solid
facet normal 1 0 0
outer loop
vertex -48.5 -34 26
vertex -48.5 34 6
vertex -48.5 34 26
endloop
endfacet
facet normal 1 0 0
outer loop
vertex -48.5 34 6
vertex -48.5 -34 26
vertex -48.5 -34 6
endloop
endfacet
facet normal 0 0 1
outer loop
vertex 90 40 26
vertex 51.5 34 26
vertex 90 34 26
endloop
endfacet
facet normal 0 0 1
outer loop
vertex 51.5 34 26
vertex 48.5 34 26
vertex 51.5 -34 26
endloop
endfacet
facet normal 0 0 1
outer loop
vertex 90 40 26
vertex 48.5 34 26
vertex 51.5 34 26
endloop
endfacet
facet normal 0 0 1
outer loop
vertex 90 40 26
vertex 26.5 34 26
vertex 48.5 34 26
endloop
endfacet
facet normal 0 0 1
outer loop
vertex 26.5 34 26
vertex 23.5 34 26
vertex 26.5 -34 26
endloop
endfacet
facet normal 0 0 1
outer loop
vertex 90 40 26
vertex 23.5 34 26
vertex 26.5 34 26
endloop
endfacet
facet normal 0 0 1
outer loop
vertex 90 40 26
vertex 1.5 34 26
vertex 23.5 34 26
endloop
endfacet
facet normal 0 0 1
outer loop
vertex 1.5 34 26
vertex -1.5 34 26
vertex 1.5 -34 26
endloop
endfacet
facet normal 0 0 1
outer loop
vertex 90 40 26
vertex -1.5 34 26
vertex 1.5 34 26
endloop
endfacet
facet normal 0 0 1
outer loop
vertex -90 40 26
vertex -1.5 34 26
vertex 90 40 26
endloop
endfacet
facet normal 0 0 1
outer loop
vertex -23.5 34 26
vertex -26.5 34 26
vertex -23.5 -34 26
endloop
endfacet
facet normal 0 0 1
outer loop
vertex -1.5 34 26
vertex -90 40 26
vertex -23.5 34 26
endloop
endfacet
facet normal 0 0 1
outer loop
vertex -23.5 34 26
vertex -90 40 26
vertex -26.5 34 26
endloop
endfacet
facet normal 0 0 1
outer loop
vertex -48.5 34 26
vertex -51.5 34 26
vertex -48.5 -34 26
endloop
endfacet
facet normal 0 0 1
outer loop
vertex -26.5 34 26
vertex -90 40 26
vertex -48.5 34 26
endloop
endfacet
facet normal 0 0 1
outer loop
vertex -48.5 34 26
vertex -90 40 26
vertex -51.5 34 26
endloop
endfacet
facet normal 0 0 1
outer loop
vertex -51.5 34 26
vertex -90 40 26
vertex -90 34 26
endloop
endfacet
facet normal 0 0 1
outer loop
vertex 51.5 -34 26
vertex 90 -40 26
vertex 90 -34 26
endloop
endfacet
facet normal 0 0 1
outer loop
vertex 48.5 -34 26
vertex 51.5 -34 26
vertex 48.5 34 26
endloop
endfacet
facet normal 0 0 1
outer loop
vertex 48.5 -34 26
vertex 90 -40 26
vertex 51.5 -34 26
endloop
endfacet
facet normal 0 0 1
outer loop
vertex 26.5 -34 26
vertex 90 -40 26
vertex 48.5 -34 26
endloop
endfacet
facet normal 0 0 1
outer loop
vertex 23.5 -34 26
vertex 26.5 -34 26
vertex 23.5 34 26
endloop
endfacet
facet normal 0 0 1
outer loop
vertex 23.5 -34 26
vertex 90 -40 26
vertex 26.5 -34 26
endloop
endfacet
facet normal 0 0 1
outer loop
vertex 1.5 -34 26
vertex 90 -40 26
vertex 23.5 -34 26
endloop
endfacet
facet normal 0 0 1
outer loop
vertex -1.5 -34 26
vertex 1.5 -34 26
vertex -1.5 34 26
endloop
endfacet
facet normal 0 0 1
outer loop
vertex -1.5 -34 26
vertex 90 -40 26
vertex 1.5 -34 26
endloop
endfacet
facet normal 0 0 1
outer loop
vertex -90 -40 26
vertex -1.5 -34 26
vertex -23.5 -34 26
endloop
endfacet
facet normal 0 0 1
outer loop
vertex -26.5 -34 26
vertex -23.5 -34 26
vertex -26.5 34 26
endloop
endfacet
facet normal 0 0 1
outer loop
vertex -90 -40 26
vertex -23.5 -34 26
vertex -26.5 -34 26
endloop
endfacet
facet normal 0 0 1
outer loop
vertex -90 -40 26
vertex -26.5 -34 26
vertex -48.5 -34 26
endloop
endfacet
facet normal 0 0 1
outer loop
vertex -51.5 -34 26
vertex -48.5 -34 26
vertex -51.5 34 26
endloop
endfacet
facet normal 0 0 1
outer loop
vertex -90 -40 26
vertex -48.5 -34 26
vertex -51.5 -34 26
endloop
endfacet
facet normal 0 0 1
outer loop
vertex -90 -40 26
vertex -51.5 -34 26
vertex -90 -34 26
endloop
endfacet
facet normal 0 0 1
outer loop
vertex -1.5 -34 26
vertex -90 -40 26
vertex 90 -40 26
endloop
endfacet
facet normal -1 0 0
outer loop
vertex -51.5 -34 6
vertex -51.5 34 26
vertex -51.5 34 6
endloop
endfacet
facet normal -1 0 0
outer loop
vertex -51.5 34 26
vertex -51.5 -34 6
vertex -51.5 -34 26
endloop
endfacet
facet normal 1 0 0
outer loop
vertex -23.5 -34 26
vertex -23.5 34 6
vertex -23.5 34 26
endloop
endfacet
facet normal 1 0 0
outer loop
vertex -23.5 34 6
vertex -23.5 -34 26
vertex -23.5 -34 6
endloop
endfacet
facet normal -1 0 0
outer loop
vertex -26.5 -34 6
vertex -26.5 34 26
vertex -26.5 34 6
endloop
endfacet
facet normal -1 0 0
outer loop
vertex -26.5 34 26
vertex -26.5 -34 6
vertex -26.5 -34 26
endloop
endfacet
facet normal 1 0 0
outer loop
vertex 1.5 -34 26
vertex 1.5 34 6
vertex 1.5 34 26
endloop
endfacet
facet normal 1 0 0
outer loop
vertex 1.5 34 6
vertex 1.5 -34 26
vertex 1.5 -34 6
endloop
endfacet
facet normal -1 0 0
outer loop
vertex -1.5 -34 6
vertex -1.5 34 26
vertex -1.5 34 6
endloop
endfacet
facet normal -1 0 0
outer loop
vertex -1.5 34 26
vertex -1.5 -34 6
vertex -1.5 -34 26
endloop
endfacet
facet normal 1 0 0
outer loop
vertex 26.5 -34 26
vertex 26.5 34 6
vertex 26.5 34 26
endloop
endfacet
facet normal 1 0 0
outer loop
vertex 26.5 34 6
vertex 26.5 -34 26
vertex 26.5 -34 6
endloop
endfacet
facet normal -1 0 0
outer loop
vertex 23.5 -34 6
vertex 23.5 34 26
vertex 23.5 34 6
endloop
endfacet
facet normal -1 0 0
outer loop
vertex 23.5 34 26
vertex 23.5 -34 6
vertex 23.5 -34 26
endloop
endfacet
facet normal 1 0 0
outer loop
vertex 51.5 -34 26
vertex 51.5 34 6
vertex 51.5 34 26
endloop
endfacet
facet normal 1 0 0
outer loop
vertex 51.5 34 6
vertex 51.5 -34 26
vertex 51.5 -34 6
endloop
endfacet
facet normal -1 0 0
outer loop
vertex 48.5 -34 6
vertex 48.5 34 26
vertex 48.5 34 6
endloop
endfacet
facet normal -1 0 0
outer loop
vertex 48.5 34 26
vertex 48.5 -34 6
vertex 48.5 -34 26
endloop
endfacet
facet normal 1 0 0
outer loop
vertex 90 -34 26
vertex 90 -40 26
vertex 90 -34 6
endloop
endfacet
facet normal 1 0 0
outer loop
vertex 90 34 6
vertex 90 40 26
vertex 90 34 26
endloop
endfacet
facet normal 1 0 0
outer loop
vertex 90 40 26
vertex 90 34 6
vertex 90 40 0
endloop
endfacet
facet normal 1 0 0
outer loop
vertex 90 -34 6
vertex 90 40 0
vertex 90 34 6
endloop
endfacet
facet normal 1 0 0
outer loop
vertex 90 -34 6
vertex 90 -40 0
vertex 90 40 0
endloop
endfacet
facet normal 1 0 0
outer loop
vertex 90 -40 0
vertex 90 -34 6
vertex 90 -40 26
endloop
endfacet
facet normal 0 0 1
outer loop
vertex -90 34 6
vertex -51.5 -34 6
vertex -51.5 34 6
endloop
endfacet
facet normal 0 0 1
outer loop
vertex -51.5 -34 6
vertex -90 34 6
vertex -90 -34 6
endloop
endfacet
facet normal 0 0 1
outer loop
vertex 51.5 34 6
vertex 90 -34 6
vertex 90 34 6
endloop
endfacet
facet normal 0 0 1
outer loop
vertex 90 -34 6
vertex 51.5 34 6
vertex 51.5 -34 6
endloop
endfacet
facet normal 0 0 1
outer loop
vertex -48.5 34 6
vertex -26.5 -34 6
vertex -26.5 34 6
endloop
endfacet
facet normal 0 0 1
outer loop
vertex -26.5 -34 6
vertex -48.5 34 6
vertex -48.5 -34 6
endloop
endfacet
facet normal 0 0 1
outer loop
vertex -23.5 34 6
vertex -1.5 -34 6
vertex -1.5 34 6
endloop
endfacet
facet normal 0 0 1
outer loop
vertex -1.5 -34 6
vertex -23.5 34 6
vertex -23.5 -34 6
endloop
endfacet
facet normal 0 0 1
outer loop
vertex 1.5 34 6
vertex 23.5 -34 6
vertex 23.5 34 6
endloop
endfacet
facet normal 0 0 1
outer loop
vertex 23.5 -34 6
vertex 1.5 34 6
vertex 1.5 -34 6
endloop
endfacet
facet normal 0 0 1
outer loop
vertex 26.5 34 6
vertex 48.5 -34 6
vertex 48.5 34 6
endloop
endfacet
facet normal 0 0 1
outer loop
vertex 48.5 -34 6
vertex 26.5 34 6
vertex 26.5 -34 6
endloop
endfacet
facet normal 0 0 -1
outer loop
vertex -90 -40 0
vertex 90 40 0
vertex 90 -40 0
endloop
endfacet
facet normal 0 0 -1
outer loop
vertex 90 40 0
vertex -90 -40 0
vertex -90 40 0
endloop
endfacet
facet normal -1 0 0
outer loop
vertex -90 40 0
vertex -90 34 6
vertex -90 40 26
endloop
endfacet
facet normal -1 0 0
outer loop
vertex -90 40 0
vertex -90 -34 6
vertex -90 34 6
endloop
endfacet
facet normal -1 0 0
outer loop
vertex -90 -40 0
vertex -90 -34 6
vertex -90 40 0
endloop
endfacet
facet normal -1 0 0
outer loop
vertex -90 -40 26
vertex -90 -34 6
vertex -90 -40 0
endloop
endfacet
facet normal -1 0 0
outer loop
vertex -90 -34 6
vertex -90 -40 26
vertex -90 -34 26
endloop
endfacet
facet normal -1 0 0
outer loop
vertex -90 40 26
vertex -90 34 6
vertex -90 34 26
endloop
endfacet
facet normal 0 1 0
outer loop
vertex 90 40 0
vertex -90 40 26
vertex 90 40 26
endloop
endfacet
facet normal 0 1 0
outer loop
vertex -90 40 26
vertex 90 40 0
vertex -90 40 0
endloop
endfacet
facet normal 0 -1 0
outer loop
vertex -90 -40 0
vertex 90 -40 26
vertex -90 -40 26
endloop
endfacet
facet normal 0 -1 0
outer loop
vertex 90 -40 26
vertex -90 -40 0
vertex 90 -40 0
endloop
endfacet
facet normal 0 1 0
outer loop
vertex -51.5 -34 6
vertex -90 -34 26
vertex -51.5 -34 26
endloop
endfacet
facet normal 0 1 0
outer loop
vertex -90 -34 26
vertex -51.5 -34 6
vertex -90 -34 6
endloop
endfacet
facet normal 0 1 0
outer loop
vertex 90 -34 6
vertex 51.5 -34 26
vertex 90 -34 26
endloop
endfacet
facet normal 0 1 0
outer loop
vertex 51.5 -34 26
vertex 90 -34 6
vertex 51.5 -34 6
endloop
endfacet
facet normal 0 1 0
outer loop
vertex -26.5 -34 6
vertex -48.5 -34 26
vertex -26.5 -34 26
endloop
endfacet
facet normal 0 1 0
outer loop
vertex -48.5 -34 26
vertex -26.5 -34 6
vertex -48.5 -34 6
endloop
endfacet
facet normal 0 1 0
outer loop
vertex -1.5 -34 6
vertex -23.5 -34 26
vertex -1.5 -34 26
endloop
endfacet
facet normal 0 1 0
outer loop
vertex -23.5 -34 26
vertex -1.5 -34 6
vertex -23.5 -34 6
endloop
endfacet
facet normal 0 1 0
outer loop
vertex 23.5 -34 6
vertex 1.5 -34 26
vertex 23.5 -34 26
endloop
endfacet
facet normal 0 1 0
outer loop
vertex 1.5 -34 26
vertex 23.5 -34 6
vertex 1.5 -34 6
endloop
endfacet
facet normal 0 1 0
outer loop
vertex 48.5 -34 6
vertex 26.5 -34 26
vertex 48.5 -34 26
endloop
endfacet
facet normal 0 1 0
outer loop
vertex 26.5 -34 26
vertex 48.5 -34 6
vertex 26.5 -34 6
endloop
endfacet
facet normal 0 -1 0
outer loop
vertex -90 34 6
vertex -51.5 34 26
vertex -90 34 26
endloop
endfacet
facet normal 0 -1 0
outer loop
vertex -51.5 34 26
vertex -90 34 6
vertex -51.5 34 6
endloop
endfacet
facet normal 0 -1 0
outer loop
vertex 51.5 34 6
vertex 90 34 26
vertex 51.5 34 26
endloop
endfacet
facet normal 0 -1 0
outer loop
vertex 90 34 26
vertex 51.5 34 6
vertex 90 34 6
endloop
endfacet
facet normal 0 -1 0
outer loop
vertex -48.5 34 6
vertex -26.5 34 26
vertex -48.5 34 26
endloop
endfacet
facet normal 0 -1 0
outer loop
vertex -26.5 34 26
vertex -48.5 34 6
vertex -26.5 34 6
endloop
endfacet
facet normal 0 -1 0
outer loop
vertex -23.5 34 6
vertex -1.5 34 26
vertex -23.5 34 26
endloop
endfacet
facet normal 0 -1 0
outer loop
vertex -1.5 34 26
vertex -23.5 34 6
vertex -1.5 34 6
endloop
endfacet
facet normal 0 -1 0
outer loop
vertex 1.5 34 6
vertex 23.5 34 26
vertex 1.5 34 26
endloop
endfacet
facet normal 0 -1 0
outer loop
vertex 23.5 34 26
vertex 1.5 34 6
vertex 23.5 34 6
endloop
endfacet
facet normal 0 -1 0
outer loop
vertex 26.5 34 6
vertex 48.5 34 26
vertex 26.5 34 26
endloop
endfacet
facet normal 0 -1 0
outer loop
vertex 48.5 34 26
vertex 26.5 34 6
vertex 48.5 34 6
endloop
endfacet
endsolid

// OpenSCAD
$fn = 32;

// ----------------------------------------------------------------------
// Rib frame 180 x 80 x 26
// 5 ribs at 25 mm pitch
// ----------------------------------------------------------------------

// --- parameters (mm) ---
frame = [180, 80, 6];  // base plate size (x, y, z)
rail_w = 6;            // side rail width
ribs = 5;              // number of ribs
rib_t = 3;             // rib thickness
rib_h = 20;            // rib height above the base plate
pitch = 25;            // pitch between rib centres

// --- derived feature positions (mm) ---
span = (ribs - 1) * pitch;          // = 100   distance between the outer ribs
origin_x = -span / 2;               // = -50   X of the first rib
rib_len = frame[1] - 2 * rail_w + 2;  // = 70   rib length, 1 mm into each rail
feature_centers = [
  [origin_x + 0 * pitch, 0],
  [origin_x + 1 * pitch, 0],
  [origin_x + 2 * pitch, 0],
  [origin_x + 3 * pitch, 0],
  [origin_x + 4 * pitch, 0]
];   // rib centre line, drives the rib loop

// base plate, two side rails, then the ribs read straight off feature_centers
union() {
  translate([-frame[0] / 2, -frame[1] / 2, 0]) cube(frame);
  translate([-frame[0] / 2, -frame[1] / 2, 0]) cube([frame[0], rail_w, frame[2] + rib_h]);
  translate([-frame[0] / 2, frame[1] / 2 - rail_w, 0]) cube([frame[0], rail_w, frame[2] + rib_h]);
  for (centre = feature_centers)
    translate([centre[0] - rib_t / 2, centre[1] - rib_len / 2, frame[2] - 1])
      cube([rib_t, rib_len, rib_h + 1]);
}
